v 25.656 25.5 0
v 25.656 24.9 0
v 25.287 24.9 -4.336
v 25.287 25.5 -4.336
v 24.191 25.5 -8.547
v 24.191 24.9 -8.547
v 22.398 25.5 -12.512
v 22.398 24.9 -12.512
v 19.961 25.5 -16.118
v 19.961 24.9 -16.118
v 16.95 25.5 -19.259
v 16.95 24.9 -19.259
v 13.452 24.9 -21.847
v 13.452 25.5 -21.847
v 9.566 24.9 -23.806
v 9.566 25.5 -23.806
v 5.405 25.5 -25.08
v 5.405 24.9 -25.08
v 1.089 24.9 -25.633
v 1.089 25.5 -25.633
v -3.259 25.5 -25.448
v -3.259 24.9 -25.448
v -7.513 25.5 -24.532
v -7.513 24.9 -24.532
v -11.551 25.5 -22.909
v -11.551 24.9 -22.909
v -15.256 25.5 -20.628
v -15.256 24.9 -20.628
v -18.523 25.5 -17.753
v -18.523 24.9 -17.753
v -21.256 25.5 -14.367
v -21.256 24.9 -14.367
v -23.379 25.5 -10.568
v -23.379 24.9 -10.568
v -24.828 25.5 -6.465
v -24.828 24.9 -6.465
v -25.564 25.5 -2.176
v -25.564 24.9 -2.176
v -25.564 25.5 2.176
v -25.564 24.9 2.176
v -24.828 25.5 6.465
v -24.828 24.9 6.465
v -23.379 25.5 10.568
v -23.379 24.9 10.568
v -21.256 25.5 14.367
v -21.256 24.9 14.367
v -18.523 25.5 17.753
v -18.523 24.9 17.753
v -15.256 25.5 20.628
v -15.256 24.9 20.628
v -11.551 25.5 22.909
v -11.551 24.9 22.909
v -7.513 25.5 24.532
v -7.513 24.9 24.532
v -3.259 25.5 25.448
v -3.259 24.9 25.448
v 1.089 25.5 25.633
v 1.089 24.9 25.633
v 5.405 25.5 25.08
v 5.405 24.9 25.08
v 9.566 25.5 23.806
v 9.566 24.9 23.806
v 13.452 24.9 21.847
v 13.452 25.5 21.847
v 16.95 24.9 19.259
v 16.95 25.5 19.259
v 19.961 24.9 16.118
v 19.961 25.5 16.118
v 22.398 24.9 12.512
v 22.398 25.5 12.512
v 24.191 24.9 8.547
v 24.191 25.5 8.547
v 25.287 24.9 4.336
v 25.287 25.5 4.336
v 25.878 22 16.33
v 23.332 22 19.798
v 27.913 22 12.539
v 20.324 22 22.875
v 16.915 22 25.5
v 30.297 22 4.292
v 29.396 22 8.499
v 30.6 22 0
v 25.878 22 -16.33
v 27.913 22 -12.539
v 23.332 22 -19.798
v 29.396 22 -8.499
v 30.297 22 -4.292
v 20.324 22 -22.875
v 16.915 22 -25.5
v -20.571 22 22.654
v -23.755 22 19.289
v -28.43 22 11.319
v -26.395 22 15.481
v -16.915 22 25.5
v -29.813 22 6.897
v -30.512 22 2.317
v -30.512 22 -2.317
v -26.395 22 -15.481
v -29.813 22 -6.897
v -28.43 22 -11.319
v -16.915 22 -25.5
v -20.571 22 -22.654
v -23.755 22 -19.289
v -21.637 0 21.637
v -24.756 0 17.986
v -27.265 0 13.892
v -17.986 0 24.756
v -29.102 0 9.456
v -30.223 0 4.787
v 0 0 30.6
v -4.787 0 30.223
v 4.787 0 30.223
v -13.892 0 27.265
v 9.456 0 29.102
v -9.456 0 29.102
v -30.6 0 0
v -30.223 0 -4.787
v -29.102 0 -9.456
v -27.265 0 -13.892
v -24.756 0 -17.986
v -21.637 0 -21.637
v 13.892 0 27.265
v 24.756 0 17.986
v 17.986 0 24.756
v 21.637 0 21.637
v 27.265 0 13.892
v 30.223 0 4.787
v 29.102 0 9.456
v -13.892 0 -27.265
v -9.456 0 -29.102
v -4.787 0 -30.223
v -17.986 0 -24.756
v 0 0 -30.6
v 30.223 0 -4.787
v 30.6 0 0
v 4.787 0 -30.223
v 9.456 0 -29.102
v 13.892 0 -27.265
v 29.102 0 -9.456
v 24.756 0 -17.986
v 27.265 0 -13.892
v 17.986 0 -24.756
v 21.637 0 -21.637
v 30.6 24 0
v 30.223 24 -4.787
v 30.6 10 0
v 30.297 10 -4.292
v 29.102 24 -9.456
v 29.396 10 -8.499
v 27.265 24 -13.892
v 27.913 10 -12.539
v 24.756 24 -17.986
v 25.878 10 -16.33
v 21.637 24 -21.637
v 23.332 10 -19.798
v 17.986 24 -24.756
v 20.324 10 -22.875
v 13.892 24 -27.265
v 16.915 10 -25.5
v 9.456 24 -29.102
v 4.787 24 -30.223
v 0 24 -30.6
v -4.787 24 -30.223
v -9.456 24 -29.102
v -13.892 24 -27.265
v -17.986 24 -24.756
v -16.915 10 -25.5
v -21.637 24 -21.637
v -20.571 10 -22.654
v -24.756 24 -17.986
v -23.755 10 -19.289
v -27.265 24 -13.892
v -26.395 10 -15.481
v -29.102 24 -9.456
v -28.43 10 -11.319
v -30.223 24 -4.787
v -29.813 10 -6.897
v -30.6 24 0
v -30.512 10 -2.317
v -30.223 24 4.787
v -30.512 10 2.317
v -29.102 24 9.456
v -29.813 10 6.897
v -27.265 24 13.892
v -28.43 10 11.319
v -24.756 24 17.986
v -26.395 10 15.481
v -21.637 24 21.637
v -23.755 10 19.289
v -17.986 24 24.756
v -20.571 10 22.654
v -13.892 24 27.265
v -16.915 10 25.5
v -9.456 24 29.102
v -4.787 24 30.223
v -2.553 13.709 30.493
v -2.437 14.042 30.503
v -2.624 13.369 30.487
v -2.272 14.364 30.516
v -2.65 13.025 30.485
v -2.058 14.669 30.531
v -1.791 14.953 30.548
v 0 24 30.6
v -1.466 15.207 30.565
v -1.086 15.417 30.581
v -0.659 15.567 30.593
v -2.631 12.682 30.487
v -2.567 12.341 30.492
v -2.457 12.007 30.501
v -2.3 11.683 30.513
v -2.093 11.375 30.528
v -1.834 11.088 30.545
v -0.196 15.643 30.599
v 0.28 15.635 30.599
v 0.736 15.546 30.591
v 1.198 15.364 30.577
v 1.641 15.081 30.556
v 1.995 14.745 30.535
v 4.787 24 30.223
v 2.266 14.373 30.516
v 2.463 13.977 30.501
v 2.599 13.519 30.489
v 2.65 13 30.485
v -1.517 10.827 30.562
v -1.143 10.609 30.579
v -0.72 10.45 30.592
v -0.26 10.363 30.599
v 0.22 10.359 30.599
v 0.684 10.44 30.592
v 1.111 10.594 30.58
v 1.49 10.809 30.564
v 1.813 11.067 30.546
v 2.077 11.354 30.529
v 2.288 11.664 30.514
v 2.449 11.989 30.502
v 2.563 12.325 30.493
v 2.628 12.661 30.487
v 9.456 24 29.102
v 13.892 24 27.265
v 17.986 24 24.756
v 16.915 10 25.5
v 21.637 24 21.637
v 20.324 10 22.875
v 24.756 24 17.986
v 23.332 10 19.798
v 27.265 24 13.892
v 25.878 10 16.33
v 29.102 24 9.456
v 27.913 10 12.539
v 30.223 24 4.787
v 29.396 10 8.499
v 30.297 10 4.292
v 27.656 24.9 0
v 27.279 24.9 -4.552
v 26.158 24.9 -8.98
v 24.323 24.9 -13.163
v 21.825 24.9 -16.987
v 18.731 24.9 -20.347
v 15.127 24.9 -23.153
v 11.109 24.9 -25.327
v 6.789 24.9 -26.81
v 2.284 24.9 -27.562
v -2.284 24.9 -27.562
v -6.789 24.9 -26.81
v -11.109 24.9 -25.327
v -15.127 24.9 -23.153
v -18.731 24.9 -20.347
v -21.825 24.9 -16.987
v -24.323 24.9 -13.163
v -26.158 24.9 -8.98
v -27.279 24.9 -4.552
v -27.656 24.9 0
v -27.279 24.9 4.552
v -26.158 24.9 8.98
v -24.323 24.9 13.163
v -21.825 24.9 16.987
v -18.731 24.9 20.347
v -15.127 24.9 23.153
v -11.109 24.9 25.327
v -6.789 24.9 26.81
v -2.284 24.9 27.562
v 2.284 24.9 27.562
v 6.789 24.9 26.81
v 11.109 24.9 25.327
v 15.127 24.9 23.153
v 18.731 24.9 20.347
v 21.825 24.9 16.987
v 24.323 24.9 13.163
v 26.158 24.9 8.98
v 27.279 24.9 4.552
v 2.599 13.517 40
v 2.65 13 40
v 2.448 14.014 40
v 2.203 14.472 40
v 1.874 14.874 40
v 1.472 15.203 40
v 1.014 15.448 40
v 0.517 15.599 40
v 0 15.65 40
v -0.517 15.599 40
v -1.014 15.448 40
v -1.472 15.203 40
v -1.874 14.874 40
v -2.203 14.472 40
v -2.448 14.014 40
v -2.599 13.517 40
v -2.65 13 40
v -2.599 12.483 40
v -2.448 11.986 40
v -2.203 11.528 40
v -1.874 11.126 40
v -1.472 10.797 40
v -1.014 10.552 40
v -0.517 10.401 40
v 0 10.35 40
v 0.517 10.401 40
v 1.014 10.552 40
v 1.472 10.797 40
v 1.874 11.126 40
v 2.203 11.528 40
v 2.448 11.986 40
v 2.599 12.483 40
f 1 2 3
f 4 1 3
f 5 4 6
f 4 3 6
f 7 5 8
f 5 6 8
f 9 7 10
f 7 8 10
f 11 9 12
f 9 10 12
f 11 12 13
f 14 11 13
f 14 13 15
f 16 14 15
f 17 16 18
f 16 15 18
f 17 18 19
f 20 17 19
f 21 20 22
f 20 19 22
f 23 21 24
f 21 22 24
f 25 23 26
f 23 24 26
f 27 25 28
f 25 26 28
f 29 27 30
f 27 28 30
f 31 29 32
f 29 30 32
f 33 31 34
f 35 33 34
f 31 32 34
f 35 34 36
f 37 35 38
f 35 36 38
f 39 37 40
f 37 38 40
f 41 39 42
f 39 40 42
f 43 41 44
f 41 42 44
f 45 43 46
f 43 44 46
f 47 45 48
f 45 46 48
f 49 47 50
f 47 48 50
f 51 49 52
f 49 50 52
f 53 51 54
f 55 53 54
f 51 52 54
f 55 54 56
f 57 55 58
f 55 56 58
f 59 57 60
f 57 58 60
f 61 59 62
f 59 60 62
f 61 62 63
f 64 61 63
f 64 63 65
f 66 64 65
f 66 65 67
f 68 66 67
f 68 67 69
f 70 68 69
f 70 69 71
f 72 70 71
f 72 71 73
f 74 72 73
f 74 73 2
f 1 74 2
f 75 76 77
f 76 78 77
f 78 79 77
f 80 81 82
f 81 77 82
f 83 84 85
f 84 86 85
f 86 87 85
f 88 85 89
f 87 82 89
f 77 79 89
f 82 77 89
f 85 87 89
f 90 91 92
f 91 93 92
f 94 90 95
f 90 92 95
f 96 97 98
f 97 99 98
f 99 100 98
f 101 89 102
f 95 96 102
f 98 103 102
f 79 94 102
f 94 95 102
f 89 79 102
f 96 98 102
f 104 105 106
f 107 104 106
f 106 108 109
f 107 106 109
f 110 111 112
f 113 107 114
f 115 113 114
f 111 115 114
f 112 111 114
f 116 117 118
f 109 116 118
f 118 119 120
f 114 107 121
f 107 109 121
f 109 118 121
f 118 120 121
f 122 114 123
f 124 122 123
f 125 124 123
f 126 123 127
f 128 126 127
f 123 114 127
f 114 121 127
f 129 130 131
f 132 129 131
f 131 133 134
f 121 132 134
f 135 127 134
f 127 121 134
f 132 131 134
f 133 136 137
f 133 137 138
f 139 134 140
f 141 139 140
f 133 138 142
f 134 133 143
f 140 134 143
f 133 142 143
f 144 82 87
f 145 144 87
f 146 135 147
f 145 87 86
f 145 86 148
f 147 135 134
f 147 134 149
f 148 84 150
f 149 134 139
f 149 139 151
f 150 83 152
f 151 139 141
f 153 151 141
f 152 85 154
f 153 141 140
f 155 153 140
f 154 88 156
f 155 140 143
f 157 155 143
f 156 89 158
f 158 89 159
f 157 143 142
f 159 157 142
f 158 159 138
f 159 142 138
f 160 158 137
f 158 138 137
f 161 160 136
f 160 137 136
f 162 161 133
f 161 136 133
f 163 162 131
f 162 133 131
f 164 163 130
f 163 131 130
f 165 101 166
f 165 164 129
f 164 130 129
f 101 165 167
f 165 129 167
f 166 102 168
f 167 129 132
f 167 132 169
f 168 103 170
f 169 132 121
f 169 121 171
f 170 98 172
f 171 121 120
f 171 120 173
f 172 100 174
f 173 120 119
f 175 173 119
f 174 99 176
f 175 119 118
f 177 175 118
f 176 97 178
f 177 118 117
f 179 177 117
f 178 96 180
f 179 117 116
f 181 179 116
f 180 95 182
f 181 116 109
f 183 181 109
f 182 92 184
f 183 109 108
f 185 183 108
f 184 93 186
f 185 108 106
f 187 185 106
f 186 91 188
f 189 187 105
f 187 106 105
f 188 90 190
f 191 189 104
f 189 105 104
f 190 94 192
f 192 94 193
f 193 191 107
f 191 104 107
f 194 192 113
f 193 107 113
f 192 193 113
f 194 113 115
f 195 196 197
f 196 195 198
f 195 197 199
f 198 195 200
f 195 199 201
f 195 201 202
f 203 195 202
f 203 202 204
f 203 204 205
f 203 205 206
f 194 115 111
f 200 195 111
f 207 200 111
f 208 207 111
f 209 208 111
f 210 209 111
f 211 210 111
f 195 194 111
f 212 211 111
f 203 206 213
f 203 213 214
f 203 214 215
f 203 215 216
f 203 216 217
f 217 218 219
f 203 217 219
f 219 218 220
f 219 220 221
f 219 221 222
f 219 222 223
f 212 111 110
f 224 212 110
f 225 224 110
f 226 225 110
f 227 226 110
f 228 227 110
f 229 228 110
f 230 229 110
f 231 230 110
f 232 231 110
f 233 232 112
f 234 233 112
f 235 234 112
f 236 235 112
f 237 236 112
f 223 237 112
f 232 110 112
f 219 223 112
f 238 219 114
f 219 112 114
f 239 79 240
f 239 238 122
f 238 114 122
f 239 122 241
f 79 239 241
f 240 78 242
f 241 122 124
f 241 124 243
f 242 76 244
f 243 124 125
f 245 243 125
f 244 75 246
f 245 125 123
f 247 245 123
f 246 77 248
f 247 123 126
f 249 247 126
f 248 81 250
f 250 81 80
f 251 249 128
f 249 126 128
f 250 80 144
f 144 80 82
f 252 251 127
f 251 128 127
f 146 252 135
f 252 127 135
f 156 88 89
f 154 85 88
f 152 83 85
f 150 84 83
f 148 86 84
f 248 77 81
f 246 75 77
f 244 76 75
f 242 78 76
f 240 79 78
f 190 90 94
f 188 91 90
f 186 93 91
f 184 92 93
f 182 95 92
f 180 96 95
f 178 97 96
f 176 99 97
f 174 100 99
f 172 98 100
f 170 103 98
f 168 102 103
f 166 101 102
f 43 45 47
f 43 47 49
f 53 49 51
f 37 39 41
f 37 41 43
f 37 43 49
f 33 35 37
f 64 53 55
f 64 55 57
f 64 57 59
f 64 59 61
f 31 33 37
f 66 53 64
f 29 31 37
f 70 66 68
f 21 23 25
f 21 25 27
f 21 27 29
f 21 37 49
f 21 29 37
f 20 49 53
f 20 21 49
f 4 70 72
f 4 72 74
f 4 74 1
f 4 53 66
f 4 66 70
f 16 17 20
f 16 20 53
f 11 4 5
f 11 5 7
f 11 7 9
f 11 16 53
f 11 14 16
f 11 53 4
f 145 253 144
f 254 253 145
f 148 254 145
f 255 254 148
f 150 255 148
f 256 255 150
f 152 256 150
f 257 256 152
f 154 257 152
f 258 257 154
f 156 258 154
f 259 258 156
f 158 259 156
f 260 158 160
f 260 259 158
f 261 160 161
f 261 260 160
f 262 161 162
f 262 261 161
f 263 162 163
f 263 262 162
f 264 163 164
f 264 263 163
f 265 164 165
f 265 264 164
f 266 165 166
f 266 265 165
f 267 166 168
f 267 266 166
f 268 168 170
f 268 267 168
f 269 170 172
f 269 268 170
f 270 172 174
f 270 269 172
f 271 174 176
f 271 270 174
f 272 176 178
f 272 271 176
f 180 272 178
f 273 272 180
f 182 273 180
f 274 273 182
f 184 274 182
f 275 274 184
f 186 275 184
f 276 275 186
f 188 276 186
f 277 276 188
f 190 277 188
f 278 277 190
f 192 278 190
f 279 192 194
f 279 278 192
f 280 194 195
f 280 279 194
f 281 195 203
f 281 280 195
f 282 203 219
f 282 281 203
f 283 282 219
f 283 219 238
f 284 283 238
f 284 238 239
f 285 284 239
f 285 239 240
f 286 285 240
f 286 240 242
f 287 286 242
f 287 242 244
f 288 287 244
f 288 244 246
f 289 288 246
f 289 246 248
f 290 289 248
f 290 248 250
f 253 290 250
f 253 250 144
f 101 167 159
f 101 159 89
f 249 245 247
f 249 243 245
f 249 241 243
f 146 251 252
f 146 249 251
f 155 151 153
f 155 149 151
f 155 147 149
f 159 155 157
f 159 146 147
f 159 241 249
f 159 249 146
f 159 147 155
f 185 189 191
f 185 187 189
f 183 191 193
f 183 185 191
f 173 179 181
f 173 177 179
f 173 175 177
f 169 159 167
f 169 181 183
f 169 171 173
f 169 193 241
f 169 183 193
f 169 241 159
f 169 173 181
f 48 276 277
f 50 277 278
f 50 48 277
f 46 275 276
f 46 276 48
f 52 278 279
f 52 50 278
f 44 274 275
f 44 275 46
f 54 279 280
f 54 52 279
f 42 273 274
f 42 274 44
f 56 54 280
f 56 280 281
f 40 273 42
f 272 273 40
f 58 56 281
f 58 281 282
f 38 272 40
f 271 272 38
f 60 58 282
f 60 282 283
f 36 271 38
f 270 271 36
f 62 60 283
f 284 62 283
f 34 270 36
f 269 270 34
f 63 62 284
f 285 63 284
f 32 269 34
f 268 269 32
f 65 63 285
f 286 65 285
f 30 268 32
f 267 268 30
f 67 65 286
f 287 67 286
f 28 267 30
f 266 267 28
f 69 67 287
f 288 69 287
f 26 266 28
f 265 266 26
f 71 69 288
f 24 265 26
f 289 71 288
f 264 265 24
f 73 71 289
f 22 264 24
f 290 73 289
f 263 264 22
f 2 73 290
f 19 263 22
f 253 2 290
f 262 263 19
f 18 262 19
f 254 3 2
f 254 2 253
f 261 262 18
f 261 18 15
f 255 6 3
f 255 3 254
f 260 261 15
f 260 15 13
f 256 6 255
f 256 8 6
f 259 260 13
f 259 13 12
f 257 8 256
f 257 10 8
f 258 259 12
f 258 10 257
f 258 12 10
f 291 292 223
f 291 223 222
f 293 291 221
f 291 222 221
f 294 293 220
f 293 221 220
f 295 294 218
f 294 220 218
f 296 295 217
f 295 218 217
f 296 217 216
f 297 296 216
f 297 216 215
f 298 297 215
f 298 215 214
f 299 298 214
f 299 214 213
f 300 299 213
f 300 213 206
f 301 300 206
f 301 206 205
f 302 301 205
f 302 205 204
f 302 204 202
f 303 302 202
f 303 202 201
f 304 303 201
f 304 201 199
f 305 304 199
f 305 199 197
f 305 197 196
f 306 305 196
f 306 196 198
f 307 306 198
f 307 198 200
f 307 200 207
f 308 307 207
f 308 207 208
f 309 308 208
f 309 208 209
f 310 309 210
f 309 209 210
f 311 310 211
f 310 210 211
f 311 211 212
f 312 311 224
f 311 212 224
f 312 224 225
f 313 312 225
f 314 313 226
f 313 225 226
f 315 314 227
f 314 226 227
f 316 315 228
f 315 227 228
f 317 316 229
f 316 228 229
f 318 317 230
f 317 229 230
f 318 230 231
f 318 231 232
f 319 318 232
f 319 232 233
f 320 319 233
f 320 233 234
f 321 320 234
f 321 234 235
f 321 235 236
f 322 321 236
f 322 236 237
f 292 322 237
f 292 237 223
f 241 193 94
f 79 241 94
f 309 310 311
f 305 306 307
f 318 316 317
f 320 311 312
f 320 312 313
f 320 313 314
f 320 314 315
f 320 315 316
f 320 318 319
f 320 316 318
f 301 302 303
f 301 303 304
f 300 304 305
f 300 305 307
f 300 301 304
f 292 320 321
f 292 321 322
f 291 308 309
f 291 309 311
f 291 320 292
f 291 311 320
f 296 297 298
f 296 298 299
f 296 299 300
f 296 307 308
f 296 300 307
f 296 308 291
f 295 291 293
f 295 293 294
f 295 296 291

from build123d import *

# Parameters (mm, degrees)
SKETCH_1_R               = 30.6
EXTRUDE_1_DEPTH          = 24
SKETCH_3_R               = 30.6
EXTRUDE_2_DEPTH          = 0.9
EXTRUDE_2_TAPER          = 73
SKETCH_4_R               = 25.656232643
EXTRUDE_3_DEPTH          = 0.6
SKETCH_5_W               = 51
SKETCH_5_H               = 12
CUT_EXTRUDE_1_DEPTH      = 31.6000001
CUT_EXTRUDE_1_DEPTH_BACK = 31.6000001
SKETCH_6_R               = 2.65
EXTRUDE_4_DEPTH          = 13


with BuildPart() as part:
    # 草图1 → 凸台-拉伸1 (new body)
    with BuildSketch(Plane(origin=(0, 0, 0), x_dir=(1, 0, 0), z_dir=(0, 1, 0))):
        Circle(SKETCH_1_R)
    extrude(amount=EXTRUDE_1_DEPTH)

    # 草图3 → 凸台-拉伸2 (add)
    with BuildSketch(Plane(origin=(0, 24, 0), x_dir=(1, 0, 0), z_dir=(0, 1, 0))):
        Circle(SKETCH_3_R)
    extrude(amount=EXTRUDE_2_DEPTH, taper=EXTRUDE_2_TAPER)

    # 草图4 → 凸台-拉伸3 (add)
    with BuildSketch(Plane(origin=(0, 24.9, 0), x_dir=(1, 0, 0), z_dir=(0, 1, 0))):
        Circle(SKETCH_4_R)
    extrude(amount=EXTRUDE_3_DEPTH)

    # 草图5 → 切除-拉伸1 (cut, two sides)
    with BuildSketch(Plane(origin=(0, 0, 0), x_dir=(0, 0, -1), z_dir=(1, 0, 0))) as cut_extrude_1_sk:
        with Locations((0, 16)):
            Rectangle(SKETCH_5_W, SKETCH_5_H)
    extrude(amount=CUT_EXTRUDE_1_DEPTH, mode=Mode.SUBTRACT)
    extrude(cut_extrude_1_sk.sketch, amount=-CUT_EXTRUDE_1_DEPTH_BACK, mode=Mode.SUBTRACT)

    # 草图6 → 凸台-拉伸4 (add)
    with BuildSketch(Plane.XY.offset(27)):
        with Locations((0, 13)):
            Circle(SKETCH_6_R)
    extrude(amount=EXTRUDE_4_DEPTH)


solid = part.part
